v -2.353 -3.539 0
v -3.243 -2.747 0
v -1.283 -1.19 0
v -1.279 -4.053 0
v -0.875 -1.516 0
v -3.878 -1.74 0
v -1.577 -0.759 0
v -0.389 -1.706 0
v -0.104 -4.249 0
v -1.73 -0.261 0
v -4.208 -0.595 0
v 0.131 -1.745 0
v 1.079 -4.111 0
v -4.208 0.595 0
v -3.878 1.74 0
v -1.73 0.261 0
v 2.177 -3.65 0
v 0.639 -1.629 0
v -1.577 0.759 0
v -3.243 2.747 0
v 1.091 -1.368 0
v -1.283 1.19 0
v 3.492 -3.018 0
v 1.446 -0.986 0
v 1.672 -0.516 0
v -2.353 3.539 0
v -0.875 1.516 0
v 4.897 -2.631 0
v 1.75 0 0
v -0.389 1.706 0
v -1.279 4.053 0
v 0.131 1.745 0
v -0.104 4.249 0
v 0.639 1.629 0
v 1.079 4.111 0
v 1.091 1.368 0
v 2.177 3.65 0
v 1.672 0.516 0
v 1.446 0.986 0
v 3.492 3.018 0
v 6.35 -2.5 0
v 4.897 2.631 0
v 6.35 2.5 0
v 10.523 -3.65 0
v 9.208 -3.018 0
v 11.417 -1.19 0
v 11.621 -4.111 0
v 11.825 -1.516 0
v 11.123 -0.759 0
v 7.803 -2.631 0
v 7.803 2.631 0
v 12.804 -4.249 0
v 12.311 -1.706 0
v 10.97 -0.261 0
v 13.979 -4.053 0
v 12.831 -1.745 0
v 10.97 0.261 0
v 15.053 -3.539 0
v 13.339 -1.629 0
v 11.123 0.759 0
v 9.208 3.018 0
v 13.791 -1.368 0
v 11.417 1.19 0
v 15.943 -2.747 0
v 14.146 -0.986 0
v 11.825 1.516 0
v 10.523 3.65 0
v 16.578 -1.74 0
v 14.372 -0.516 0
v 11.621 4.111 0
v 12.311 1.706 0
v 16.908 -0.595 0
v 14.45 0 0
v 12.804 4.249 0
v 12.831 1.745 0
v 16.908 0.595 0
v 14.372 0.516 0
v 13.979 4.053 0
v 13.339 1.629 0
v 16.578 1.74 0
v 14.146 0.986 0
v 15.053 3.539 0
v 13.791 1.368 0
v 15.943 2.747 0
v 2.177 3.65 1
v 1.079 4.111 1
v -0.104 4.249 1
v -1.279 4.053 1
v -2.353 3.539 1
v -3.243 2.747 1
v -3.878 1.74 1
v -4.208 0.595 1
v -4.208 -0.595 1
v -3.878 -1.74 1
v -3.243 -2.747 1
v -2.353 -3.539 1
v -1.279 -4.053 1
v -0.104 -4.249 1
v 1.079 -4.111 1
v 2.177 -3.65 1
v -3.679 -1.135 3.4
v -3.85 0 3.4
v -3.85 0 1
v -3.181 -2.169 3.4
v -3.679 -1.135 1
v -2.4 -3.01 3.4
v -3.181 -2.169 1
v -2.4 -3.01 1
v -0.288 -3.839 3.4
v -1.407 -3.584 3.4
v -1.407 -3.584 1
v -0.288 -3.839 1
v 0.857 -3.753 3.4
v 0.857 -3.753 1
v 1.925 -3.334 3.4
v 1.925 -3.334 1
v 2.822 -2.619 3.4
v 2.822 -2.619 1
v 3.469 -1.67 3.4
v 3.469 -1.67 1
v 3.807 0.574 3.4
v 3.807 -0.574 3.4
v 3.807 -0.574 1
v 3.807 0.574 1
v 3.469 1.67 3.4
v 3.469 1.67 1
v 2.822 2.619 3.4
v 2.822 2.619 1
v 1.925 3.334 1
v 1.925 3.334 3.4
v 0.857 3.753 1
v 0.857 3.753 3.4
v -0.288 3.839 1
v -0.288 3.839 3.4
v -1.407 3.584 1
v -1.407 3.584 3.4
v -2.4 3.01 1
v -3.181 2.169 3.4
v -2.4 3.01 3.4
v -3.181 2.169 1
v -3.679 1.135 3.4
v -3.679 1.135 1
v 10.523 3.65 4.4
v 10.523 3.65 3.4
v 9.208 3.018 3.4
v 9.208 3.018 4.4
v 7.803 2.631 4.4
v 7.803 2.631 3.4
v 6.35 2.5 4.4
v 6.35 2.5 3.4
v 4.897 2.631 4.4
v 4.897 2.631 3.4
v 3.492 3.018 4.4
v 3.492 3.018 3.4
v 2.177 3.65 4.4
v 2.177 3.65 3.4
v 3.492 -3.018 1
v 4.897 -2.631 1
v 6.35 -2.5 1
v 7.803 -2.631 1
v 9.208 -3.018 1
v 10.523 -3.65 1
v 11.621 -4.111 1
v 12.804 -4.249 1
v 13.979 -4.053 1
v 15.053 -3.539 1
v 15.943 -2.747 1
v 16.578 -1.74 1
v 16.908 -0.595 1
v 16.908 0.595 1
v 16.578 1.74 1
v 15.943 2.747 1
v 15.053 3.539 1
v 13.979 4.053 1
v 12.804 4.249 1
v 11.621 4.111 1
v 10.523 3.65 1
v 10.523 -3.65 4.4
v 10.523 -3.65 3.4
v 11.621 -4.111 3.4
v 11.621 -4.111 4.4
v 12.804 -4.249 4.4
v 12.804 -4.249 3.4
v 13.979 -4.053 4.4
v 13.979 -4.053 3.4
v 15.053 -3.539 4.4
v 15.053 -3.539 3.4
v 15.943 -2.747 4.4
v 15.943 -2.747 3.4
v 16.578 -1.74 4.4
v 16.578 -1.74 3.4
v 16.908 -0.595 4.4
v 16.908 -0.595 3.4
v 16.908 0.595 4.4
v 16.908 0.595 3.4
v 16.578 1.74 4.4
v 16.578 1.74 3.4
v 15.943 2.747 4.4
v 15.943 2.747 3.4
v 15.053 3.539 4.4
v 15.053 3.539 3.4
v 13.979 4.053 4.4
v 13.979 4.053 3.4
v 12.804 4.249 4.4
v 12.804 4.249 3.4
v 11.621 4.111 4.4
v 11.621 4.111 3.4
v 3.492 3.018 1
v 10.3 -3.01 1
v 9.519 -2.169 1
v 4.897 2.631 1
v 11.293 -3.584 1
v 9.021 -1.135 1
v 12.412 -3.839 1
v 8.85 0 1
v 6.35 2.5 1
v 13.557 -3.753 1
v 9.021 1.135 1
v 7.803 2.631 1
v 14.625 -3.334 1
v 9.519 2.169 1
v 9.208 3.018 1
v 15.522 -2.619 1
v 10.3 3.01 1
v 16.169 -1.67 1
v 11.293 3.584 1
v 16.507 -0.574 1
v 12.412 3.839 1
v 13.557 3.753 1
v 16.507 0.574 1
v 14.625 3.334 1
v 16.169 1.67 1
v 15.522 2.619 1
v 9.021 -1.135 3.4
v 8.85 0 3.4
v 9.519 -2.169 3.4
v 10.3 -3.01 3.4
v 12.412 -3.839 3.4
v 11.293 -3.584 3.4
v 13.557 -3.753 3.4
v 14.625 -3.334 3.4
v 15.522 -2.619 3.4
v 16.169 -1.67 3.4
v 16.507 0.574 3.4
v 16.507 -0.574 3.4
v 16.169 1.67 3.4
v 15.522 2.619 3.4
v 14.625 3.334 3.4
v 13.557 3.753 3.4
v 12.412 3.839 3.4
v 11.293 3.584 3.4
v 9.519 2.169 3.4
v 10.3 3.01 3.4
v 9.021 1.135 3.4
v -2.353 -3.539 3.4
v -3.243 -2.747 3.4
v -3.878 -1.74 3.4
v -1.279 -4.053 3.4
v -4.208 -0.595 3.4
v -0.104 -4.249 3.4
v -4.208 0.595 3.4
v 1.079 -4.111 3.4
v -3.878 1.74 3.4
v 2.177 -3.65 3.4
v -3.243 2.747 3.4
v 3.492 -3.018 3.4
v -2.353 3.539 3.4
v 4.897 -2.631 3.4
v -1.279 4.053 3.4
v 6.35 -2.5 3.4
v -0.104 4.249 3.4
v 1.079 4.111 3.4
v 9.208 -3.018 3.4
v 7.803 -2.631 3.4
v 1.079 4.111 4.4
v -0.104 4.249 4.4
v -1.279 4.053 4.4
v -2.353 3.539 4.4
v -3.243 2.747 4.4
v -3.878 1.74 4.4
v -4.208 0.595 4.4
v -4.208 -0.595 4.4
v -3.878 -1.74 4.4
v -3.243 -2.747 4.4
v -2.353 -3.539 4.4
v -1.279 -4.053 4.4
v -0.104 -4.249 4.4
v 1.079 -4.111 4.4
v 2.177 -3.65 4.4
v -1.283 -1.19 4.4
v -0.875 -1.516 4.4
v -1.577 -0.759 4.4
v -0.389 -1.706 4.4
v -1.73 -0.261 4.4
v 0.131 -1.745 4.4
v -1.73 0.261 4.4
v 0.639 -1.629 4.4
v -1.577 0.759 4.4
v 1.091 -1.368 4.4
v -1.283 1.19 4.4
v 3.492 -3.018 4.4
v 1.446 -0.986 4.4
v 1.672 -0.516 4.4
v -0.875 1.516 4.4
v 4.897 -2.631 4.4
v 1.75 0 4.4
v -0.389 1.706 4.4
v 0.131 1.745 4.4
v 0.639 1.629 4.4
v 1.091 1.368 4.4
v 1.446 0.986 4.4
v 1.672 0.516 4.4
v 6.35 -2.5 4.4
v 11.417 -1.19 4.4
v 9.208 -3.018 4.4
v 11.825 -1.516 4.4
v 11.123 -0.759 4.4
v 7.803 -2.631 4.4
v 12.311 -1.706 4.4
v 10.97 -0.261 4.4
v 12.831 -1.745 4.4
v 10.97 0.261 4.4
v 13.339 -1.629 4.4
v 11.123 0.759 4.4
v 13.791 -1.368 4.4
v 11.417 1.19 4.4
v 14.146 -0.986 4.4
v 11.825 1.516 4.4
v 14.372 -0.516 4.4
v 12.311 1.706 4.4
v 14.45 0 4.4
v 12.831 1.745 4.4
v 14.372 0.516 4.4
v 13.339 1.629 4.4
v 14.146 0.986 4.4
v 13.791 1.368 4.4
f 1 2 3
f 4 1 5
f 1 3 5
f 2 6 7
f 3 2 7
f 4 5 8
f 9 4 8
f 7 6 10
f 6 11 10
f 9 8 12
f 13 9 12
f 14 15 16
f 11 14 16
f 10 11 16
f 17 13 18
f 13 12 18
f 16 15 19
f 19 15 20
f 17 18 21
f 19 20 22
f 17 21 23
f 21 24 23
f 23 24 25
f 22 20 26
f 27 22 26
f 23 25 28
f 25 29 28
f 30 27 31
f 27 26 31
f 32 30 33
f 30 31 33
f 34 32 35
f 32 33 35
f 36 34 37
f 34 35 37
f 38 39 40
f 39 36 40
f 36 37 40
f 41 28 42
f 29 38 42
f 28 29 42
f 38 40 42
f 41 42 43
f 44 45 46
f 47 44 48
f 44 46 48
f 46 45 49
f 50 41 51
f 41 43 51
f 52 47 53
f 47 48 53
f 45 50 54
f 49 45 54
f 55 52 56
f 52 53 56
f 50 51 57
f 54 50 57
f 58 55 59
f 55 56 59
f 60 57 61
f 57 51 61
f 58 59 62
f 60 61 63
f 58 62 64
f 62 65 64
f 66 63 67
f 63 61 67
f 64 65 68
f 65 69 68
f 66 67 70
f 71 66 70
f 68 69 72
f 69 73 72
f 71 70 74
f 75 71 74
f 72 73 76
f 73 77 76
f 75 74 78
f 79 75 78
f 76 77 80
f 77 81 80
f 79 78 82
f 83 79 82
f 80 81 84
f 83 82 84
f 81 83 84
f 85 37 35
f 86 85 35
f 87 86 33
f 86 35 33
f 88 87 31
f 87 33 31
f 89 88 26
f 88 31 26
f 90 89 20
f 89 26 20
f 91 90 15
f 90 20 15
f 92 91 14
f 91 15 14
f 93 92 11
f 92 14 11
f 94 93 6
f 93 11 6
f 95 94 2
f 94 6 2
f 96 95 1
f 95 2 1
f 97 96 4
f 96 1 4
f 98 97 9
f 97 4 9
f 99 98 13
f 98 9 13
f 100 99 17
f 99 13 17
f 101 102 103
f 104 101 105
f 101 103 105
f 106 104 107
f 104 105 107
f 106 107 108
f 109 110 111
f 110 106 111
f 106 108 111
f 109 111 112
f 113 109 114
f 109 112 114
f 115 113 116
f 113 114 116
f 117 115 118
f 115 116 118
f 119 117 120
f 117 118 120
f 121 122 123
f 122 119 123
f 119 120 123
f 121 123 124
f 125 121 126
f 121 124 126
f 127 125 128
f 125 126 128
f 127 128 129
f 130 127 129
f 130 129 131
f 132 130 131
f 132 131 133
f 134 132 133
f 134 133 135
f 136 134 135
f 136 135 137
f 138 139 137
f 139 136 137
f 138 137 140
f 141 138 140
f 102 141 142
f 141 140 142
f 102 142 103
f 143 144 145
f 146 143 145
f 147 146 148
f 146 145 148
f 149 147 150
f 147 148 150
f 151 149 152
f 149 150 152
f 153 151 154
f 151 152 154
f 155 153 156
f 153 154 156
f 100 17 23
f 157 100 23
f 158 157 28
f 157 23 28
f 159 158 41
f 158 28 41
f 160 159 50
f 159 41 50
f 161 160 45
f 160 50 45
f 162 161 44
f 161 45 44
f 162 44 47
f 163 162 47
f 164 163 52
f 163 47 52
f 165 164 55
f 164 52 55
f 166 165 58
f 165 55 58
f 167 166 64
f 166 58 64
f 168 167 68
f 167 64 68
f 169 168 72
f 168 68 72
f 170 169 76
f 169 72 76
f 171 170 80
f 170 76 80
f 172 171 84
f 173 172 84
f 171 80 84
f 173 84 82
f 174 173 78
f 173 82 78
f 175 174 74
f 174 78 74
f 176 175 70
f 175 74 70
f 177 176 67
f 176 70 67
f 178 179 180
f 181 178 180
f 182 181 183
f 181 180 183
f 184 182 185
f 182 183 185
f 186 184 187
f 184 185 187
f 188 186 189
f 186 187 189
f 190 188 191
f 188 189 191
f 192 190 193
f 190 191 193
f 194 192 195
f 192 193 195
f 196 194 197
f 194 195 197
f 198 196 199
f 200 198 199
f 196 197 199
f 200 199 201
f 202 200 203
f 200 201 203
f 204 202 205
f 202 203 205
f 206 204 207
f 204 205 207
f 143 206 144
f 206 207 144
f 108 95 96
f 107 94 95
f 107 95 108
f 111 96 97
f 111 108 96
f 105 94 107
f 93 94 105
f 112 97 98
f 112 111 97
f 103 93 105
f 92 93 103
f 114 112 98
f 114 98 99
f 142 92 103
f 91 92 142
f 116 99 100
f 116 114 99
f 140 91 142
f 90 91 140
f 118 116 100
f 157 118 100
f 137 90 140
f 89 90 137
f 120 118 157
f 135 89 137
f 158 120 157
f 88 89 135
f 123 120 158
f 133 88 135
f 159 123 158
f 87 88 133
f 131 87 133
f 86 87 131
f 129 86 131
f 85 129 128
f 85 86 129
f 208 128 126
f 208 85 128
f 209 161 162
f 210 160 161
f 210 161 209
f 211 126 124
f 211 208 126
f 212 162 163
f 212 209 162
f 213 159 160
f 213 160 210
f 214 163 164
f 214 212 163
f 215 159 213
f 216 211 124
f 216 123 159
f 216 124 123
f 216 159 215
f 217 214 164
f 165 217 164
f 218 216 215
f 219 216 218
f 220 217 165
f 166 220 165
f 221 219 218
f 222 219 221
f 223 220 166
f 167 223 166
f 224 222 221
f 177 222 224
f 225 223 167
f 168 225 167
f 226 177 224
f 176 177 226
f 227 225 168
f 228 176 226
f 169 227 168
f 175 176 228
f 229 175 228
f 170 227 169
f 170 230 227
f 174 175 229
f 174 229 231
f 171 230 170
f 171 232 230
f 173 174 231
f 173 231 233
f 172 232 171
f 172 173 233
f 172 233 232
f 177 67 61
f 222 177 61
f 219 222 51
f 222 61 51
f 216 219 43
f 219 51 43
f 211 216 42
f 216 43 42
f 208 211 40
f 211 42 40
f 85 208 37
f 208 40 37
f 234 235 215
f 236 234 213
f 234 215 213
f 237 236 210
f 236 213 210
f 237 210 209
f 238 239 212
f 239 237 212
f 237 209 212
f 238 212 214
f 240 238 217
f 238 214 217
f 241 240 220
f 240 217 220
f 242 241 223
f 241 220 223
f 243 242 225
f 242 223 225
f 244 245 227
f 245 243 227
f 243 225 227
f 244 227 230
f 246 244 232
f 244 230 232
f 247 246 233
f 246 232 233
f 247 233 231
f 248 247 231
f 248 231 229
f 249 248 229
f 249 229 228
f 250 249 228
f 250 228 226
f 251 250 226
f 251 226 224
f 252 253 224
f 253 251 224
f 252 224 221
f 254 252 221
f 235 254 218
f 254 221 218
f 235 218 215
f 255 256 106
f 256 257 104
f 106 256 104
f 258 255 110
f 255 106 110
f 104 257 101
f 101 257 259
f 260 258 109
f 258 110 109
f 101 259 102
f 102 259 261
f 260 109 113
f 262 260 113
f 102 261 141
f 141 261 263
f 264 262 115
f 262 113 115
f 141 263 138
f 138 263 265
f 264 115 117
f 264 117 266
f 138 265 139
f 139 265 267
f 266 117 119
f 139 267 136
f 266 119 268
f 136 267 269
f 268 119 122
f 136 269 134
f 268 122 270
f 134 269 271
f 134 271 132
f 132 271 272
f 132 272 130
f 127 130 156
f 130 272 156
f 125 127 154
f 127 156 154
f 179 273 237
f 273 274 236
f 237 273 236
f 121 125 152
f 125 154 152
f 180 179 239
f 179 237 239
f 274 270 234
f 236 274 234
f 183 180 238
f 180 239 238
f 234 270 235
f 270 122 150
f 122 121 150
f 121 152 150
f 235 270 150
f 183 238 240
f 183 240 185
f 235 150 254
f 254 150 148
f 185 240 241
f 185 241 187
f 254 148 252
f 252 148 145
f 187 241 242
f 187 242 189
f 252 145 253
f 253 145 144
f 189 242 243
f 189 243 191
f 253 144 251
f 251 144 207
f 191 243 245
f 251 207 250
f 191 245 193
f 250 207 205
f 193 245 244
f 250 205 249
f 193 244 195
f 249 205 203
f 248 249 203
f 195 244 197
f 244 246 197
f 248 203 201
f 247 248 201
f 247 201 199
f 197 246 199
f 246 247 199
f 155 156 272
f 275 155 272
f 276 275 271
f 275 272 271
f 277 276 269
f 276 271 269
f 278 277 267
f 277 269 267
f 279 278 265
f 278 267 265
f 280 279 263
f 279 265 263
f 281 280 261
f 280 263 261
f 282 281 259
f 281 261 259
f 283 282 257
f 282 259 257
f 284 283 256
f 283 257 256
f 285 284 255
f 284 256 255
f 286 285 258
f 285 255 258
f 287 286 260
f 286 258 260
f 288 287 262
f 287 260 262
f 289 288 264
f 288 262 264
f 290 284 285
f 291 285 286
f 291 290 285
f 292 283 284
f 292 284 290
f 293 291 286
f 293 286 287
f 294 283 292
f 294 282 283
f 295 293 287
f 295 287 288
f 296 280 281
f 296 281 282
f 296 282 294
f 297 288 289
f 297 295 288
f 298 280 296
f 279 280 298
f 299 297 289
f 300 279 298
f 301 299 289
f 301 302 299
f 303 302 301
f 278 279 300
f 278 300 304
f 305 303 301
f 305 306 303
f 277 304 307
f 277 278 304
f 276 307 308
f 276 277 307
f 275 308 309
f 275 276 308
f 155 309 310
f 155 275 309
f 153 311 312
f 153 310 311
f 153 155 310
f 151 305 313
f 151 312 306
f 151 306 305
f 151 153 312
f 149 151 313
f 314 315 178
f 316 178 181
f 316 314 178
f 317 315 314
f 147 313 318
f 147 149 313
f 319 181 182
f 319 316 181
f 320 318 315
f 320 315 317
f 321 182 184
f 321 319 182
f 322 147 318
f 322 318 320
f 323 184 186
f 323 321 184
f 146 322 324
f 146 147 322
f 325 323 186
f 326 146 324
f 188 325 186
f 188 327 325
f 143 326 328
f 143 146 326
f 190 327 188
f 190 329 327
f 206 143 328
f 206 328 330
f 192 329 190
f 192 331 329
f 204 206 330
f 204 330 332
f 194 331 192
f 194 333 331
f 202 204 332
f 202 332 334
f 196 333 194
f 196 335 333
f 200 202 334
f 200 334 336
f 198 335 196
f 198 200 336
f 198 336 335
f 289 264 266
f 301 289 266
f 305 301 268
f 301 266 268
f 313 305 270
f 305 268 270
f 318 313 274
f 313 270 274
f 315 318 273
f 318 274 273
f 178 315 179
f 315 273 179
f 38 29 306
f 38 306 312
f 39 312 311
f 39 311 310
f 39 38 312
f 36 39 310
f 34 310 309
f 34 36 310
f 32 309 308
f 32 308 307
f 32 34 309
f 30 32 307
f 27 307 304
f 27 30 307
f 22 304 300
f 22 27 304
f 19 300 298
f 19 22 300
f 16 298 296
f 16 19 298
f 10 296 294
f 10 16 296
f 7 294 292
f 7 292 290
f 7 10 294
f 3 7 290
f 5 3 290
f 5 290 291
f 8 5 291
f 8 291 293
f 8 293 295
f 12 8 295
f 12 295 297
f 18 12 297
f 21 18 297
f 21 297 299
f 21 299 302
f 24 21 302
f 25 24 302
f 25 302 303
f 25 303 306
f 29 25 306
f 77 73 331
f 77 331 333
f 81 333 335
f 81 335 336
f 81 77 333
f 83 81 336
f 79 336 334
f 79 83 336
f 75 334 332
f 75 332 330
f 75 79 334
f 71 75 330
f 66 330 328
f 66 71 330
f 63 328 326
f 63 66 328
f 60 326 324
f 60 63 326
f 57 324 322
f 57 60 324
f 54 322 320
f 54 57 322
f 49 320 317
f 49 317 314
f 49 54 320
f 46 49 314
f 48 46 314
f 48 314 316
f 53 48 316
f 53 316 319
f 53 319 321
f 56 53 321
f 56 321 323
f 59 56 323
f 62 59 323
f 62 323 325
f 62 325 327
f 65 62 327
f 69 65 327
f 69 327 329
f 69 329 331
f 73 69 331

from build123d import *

# Parameters (mm, degrees)
SKETCH1_R           = 1.75
BOSS_EXTRUDE1_DEPTH = 1
BOSS_EXTRUDE3_REACH = 19.802
SKETCH4_R           = 3.85
SKETCH4_R_2         = 1.75


with BuildPart() as part:
    # Sketch1 → Boss-Extrude1 (new body)
    with BuildSketch(Plane.XY):
        with BuildLine():
            ThreePointArc((2.177163766, 3.649994238), (-4.25, 0), (2.177163766, -3.649994238))
            ThreePointArc((2.177163766, -3.649994238), (6.35, -2.5), (10.522836234, -3.649994238))
            ThreePointArc((10.522836234, -3.649994238), (16.95, 0), (10.522836234, 3.649994238))
            ThreePointArc((10.522836234, 3.649994238), (6.35, 2.5), (2.177163766, 3.649994238))
        make_face()
        Circle(SKETCH1_R, mode=Mode.SUBTRACT)
        with Locations((12.7, 0)):
            Circle(SKETCH1_R, mode=Mode.SUBTRACT)
    extrude(amount=BOSS_EXTRUDE1_DEPTH)


with BuildPart() as body_2:
    # Body-Move/Copy1: copy of part
    add(part.part.moved(Location((0, 0, 3.4))))

    # Sketch4 → Boss-Extrude3 (add, up to next)
    with BuildSketch(Plane.XY.offset(1), mode=Mode.PRIVATE) as boss_extrude3_sk1:
        Circle(SKETCH4_R)
        Circle(SKETCH4_R_2, mode=Mode.SUBTRACT)
    boss_extrude3_tool1 = extrude(boss_extrude3_sk1.sketch, amount=BOSS_EXTRUDE3_REACH, mode=Mode.PRIVATE) - body_2.part
    # Sketch4 → Boss-Extrude3 (add, up to next)
    with BuildSketch(Plane.XY.offset(1), mode=Mode.PRIVATE) as boss_extrude3_sk2:
        with Locations((12.7, 0)):
            Circle(SKETCH4_R)
        with Locations((12.7, 0)):
            Circle(SKETCH4_R_2, mode=Mode.SUBTRACT)
    boss_extrude3_tool2 = extrude(boss_extrude3_sk2.sketch, amount=BOSS_EXTRUDE3_REACH, mode=Mode.PRIVATE) - body_2.part

    add(part.part)  # Boss-Extrude3 merges part
    add(boss_extrude3_tool1.solids().sort_by_distance((-3.741106, 0, 1))[0])
    add(boss_extrude3_tool2.solids().sort_by_distance((8.958894, 0, 1))[0])


solid = body_2.part
